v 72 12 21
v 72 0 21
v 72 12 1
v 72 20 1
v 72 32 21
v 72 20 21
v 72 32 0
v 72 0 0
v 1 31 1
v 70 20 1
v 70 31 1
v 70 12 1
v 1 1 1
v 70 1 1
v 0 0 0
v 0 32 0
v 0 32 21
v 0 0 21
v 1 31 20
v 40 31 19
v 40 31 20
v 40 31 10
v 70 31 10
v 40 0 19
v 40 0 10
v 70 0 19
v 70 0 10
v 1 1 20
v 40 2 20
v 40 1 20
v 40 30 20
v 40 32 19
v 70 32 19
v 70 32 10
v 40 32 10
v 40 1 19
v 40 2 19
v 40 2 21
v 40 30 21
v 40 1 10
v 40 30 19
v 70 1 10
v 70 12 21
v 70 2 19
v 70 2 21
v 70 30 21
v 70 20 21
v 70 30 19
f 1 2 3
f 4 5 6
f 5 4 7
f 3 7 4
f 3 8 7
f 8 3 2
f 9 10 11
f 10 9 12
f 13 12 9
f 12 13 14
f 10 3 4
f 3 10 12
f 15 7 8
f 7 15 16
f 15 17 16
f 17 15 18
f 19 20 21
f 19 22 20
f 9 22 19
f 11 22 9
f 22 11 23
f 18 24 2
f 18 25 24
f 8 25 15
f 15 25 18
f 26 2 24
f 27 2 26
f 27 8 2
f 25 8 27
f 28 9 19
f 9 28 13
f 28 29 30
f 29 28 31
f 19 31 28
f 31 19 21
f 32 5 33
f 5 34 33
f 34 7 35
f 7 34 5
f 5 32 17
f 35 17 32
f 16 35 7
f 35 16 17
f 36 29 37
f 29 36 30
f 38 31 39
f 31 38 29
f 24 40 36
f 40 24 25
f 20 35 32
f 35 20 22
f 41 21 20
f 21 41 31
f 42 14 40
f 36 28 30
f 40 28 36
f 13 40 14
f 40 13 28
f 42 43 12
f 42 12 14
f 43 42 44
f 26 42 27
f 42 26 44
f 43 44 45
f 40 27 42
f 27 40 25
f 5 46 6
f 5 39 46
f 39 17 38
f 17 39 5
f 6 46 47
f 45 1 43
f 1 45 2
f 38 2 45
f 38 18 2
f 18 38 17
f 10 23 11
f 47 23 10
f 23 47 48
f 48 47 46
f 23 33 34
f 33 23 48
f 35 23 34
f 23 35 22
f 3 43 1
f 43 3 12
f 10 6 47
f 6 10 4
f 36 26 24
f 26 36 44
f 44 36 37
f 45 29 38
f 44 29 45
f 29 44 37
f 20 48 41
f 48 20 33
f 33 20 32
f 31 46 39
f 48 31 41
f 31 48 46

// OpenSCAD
color([0,0,1])
cube([72,31,1]);
cube([1,32,20]);
cube([40,1,20]);
translate([40,0,0]) {
cube([30,1,10]);
}
translate([0,0,20]) {
color([1,0,0])
    cube([40,32,1]);
}

translate([40,31,0]) {
cube([30,1,10]);
}

translate([0,31,0]){ 
    cube([40,1,20]);
}

translate([0,31,0]){ 
    cube([40,1,20]);
}

translate([70,0,0]){ 
    cube([2,12,21]);
}


translate([70,20,0]){ 
    cube([2,12,21]);
}

translate([40,0,19]){ 
color([1,0,0])
    cube([30,2,2]);
}

translate([40,30,19]){ 
color([1,0,0])
    cube([30,2,2]);
}
